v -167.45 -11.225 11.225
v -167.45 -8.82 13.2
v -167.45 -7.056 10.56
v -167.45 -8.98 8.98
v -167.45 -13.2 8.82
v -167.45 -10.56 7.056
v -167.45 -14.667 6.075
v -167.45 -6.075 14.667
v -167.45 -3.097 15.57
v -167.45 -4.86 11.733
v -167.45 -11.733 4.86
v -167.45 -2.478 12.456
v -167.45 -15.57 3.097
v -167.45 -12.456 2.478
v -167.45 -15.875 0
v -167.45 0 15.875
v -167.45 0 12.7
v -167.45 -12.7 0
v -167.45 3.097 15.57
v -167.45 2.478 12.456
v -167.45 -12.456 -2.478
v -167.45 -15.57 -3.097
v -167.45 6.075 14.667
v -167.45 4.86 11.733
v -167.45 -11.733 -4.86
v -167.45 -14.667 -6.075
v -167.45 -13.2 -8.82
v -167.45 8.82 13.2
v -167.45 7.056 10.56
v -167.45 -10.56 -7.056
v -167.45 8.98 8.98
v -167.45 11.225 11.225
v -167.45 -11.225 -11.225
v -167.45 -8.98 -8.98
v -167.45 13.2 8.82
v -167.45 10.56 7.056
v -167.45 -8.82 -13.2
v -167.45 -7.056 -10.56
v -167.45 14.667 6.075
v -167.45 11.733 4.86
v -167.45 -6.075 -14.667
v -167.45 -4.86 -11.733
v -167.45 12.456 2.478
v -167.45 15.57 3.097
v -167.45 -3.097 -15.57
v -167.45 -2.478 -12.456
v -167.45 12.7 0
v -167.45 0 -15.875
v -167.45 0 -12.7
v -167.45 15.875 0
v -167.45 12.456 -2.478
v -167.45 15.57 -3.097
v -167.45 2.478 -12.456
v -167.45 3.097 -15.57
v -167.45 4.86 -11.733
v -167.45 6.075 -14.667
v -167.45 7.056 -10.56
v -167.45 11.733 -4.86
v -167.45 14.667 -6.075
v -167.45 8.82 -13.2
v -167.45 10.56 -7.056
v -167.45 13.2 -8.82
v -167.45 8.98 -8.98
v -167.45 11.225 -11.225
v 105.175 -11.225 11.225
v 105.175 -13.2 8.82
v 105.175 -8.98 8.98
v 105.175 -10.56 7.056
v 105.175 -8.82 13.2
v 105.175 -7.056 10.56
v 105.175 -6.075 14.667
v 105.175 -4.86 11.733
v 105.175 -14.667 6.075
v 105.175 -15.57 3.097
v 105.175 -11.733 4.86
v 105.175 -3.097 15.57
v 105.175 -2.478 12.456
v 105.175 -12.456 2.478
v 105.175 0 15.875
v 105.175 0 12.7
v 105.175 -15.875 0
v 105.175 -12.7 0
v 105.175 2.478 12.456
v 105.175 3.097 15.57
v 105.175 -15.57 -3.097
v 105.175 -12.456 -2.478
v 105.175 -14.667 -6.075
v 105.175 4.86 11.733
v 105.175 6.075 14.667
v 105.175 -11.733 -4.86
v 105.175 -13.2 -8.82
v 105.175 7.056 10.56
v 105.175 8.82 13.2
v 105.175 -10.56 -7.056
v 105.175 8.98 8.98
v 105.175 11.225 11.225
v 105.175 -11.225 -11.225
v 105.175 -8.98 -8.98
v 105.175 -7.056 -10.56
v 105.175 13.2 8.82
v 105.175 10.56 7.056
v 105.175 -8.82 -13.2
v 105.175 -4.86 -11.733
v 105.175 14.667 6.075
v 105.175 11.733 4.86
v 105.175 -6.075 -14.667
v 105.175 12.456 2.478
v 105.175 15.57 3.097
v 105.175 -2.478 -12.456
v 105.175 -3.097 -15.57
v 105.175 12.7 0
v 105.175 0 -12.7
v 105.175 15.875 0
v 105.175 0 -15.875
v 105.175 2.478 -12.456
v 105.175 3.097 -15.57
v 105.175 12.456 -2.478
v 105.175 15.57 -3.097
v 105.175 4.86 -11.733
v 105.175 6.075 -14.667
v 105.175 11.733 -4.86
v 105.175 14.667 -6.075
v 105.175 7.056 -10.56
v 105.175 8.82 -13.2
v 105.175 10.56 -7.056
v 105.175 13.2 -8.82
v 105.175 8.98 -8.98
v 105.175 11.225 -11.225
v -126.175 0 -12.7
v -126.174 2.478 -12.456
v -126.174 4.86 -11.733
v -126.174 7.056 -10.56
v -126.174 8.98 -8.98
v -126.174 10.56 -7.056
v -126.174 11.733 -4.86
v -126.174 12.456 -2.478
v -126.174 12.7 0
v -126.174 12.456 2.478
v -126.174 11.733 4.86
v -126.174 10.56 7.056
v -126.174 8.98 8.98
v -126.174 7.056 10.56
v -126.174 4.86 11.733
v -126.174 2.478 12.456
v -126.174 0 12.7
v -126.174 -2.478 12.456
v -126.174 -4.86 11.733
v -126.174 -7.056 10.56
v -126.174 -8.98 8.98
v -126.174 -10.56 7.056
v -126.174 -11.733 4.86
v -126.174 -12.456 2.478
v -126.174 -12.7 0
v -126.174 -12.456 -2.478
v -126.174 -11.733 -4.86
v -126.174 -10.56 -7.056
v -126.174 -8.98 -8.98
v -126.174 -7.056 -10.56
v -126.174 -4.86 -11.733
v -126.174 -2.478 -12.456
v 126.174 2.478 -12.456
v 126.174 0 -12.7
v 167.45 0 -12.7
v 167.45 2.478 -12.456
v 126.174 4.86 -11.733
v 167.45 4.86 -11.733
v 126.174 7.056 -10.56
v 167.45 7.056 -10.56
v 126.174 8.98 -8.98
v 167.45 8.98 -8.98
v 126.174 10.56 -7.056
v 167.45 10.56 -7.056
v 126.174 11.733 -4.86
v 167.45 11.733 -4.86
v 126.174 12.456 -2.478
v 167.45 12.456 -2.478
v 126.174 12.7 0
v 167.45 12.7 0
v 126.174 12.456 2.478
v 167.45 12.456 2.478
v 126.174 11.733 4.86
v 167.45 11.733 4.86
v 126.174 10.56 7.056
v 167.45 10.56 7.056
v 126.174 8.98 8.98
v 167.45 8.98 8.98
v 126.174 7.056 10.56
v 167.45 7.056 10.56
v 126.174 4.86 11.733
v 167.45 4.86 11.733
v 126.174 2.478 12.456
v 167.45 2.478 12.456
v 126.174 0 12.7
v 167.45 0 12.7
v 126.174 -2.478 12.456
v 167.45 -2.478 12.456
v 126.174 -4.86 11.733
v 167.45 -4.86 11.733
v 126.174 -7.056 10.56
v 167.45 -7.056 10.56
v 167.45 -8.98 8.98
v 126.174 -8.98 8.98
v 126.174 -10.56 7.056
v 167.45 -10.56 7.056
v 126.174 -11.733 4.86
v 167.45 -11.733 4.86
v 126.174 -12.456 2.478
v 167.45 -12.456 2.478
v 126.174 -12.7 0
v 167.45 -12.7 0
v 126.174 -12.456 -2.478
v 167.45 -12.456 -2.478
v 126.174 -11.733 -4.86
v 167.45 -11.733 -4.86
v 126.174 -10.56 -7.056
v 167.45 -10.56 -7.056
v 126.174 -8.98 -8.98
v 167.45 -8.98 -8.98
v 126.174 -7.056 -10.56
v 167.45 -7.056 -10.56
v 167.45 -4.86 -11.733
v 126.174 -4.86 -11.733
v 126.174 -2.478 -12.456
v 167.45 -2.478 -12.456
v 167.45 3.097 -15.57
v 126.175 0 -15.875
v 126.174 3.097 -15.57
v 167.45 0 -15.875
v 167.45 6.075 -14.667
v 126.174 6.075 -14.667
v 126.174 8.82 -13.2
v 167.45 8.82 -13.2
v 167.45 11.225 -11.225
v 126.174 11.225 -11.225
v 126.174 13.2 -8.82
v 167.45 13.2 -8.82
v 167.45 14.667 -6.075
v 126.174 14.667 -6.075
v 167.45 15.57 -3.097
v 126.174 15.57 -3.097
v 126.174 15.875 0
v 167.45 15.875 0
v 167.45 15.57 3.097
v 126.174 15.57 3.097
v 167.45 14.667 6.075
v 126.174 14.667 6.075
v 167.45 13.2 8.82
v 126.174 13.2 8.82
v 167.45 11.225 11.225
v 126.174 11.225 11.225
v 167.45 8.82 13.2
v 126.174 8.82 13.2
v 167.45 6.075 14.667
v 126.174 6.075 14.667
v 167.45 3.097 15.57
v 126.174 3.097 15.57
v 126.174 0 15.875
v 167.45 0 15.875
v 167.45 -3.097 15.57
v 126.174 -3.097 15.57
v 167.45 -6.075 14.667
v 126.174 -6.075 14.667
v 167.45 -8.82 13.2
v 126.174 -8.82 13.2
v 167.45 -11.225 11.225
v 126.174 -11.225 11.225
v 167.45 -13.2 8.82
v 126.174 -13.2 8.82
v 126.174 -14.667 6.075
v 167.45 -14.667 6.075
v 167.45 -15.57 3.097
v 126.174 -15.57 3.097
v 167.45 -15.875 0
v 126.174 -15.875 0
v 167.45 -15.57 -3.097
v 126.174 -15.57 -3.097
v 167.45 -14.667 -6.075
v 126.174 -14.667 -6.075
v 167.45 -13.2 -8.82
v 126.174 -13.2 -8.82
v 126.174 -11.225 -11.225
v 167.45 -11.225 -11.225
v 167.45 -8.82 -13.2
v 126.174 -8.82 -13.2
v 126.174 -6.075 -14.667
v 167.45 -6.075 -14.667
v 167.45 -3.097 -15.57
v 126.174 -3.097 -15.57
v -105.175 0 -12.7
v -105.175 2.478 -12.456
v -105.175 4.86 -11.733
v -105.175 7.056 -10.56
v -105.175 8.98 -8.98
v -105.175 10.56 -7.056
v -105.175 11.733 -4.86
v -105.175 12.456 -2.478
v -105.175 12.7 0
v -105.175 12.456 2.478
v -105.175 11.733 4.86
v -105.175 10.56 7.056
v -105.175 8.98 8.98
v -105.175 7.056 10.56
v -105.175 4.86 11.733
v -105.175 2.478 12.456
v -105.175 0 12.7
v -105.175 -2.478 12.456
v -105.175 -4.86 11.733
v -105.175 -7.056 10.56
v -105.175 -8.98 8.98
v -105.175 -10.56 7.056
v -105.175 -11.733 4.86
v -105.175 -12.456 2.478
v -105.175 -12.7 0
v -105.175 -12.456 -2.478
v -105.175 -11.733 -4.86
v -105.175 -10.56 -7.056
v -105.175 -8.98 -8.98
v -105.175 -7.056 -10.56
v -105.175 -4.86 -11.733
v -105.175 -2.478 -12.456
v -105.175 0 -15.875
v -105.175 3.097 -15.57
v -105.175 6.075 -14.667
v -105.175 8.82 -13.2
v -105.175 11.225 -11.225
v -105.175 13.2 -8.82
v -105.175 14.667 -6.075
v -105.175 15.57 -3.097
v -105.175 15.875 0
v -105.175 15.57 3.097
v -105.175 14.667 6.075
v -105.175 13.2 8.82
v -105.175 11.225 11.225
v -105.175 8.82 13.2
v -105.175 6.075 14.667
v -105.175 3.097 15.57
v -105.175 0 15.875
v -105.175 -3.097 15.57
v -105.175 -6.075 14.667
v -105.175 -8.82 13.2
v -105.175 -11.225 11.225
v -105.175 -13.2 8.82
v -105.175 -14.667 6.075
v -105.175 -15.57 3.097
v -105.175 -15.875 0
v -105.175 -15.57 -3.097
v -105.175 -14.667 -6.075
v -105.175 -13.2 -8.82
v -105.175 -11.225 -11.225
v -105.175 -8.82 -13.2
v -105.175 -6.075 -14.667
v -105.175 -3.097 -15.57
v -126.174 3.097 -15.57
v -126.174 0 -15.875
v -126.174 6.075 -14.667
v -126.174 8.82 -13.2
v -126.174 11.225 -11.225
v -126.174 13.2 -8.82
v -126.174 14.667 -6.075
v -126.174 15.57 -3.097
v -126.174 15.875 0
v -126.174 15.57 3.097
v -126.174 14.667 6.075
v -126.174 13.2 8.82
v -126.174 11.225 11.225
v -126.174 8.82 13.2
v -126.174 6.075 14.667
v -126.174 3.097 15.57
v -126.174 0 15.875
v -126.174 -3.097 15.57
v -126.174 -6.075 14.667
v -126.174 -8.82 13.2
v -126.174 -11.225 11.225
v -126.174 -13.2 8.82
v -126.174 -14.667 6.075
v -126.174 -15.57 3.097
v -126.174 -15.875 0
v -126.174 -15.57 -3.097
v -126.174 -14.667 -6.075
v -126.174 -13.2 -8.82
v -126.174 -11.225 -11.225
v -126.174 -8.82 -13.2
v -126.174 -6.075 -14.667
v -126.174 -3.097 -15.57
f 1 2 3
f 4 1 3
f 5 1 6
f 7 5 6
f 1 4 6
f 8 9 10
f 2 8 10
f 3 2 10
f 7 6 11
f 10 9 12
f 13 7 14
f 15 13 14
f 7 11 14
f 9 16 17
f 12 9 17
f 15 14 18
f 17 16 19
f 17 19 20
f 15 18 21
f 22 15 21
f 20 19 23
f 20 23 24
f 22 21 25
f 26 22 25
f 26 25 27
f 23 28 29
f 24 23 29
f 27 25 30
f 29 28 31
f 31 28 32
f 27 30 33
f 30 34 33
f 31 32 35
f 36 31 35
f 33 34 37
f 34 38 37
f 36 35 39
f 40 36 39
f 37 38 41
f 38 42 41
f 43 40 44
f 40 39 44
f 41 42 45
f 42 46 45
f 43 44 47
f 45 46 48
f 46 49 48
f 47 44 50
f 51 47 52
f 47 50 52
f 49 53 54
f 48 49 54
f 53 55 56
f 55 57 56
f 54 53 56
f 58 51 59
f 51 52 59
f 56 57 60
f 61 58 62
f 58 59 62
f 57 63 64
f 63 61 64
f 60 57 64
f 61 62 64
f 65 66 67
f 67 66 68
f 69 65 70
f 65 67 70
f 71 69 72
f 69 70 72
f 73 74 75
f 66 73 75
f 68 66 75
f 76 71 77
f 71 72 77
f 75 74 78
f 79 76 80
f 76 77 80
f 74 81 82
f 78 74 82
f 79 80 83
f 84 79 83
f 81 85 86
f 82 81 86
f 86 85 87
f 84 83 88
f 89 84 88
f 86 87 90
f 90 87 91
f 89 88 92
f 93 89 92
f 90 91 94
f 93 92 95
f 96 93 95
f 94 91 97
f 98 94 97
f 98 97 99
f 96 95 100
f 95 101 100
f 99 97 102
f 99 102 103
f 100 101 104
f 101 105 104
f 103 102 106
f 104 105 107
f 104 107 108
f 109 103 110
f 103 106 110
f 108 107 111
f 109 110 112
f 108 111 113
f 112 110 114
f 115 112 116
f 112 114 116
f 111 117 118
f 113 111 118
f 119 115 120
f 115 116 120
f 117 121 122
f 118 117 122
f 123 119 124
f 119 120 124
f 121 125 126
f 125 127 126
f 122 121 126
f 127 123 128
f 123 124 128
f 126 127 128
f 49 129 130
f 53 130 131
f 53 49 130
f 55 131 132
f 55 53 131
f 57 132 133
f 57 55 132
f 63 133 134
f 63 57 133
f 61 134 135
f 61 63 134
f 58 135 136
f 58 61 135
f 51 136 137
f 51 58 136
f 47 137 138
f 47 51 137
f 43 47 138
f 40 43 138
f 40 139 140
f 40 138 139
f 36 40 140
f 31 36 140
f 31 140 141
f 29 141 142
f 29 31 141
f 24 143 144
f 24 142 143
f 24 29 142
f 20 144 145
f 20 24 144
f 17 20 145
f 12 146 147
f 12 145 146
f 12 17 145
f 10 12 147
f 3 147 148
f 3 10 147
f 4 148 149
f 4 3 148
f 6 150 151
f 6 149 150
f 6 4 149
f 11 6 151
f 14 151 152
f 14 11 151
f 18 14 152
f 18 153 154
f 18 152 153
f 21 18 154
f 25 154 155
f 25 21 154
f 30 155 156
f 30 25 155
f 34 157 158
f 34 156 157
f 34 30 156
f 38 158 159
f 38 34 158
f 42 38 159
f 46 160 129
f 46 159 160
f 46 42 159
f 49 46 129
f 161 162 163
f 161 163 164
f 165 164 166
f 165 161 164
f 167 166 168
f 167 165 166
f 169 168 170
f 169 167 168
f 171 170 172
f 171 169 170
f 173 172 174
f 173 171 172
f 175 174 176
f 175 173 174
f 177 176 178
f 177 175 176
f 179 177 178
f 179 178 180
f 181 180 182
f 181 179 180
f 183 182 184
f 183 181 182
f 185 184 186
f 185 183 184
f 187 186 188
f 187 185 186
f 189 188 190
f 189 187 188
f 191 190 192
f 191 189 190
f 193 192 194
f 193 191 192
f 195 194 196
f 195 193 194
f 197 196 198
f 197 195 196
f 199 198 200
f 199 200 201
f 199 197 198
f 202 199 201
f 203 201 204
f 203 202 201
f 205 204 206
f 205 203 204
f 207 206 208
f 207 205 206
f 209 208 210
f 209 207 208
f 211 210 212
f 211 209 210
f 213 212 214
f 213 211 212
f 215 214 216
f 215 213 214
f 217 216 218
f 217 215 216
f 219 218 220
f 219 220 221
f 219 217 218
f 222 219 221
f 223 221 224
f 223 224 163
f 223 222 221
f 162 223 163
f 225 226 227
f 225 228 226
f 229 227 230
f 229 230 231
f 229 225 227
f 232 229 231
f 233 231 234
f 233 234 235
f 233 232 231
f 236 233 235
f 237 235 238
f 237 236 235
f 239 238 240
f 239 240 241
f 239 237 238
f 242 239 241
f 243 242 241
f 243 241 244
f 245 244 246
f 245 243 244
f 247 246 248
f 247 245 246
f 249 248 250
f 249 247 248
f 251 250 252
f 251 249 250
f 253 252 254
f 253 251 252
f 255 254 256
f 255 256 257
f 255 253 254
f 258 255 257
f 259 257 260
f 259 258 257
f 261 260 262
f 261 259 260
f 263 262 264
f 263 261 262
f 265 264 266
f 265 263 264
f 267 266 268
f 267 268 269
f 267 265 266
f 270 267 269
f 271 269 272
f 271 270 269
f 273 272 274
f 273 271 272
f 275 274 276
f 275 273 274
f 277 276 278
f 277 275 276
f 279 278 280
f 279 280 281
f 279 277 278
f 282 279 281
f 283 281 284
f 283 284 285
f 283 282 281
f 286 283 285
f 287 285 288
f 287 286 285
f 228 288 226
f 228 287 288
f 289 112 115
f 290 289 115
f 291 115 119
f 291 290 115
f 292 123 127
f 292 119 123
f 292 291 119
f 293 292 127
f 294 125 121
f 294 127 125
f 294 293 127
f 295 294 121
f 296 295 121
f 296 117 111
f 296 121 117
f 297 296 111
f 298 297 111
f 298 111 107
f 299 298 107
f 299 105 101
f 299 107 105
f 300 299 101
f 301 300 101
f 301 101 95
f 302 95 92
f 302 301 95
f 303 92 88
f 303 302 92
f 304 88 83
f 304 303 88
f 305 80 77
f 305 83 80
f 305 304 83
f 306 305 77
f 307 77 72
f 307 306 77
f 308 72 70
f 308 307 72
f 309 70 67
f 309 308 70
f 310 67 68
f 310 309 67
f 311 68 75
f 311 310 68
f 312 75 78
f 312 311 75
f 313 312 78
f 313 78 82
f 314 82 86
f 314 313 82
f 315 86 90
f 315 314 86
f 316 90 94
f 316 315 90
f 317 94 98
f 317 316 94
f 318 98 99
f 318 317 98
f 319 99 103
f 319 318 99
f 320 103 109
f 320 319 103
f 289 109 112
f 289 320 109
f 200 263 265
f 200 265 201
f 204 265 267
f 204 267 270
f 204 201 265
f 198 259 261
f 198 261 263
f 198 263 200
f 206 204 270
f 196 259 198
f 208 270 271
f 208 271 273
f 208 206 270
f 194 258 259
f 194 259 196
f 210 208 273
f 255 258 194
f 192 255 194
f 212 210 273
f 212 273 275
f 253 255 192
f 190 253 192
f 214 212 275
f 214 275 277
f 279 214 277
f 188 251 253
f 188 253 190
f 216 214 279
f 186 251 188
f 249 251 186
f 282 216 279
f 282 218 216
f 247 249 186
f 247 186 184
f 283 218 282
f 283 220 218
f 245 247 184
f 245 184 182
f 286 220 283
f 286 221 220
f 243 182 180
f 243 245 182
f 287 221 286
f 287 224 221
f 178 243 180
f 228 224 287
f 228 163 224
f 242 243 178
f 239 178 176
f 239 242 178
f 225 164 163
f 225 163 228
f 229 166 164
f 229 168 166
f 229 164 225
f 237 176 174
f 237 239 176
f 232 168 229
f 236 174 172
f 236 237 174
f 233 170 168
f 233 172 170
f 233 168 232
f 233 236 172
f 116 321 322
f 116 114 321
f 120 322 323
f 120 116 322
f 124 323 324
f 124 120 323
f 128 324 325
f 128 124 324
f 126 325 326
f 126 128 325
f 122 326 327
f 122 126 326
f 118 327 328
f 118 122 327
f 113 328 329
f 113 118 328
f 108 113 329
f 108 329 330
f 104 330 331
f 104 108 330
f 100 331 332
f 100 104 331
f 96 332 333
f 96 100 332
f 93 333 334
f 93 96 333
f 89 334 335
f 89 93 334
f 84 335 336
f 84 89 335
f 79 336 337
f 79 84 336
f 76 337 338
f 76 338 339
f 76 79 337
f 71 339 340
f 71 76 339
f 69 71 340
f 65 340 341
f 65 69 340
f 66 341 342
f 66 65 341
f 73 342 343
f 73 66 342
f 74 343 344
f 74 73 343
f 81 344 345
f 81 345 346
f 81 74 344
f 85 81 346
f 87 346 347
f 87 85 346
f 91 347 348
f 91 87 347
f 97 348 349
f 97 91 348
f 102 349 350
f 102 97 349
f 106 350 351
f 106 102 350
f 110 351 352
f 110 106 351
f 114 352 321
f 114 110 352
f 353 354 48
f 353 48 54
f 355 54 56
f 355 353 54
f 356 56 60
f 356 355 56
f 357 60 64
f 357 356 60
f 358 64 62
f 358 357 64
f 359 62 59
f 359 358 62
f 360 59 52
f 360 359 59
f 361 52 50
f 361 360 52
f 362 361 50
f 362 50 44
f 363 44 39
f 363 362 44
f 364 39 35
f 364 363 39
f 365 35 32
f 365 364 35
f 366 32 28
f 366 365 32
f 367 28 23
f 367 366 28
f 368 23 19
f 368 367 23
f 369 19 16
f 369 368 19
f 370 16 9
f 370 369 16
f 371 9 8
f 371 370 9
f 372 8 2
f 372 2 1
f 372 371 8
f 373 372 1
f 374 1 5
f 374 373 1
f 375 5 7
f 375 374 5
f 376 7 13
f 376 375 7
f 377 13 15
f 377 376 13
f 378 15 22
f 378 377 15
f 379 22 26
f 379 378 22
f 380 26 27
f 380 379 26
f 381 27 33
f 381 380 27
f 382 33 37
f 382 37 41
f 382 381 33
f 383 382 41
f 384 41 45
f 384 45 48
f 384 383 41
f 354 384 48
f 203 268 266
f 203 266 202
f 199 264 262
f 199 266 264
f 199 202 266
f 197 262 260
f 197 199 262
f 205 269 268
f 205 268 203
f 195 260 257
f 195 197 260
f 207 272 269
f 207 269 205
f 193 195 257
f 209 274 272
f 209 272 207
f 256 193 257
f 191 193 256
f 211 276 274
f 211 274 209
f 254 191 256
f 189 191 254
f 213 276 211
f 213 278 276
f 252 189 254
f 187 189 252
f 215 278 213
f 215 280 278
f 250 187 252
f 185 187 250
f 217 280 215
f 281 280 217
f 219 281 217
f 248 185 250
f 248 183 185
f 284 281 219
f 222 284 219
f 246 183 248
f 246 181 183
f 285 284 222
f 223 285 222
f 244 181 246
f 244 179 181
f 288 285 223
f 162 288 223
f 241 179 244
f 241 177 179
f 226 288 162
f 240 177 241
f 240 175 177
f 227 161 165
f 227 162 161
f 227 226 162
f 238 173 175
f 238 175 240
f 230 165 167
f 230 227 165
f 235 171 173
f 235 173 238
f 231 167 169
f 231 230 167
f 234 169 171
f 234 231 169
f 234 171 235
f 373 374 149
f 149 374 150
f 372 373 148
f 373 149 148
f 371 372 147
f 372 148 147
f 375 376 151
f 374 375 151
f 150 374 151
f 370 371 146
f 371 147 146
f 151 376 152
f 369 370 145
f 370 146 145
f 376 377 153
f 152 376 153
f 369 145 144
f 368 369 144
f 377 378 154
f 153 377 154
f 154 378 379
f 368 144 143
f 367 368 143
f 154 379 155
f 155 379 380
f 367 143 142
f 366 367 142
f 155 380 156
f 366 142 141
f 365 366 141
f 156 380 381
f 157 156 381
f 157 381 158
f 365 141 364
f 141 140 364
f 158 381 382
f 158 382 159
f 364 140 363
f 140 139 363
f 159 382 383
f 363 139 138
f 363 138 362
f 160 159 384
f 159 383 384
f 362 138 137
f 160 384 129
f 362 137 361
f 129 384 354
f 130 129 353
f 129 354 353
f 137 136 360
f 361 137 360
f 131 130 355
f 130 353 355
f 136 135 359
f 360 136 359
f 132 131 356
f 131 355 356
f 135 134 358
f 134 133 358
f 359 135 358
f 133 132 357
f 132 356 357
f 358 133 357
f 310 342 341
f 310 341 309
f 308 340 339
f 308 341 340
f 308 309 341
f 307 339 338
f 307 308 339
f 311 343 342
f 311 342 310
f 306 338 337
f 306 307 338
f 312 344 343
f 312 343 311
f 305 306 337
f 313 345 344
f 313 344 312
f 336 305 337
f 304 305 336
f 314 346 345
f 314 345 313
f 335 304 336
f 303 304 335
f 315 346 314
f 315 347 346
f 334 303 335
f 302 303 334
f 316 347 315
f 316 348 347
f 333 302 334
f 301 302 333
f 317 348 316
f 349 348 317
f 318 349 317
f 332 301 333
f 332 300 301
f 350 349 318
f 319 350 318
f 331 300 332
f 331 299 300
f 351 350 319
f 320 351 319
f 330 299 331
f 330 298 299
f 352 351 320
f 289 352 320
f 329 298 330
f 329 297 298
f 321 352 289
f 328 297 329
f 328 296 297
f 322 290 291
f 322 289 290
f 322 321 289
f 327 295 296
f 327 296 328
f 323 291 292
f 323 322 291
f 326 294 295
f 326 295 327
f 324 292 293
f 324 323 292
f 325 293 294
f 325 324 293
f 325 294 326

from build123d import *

# Parameters (mm, degrees)
SKETCH1_R               = 15.875
SKETCH1_R_2             = 12.7
EXTRUDE_THIN1_DEPTH     = 167.4495
CUT_EXTRUDE1_DEPTH      = 169.947821236
CUT_EXTRUDE1_DEPTH_BACK = 169.947821236
SKETCH2_W               = 20.99999991
SKETCH2_H               = 31.75


with BuildPart() as part:
    # Sketch1 → Extrude-Thin1 (new, symmetric)
    with BuildSketch(Plane(origin=(0, 0, 0), x_dir=(0, 0, -1), z_dir=(1, 0, 0))):
        Circle(SKETCH1_R)
        Circle(SKETCH1_R_2, mode=Mode.SUBTRACT)
    extrude(amount=EXTRUDE_THIN1_DEPTH, both=True)

    # Sketch2 → Cut-Extrude1 (cut, two sides: drawn at the far end of the back side and taken through both)
    with BuildSketch(Plane.XY.offset(-CUT_EXTRUDE1_DEPTH_BACK)):
        with Locations((115.674500045, 0)):
            Rectangle(SKETCH2_W, SKETCH2_H)
        with Locations((-115.674500045, 0)):
            Rectangle(SKETCH2_W, SKETCH2_H)
    extrude(amount=CUT_EXTRUDE1_DEPTH + CUT_EXTRUDE1_DEPTH_BACK, mode=Mode.SUBTRACT)


with BuildPart() as cut_extrude1_piece_1:
    # of the separate pieces the step leaves, piece 1, a body of its own (cut_extrude1_pieces)
    add(part.part.solids().sort_by_distance((-105.17450009, 0, -15.875))[0])


with BuildPart() as cut_extrude1_piece_2:
    # of the separate pieces the step leaves, piece 2, a body of its own (cut_extrude1_pieces)
    add(part.part.solids().sort_by_distance((-167.4495, 0, -15.875))[0])


with BuildPart() as cut_extrude1_piece_3:
    # of the separate pieces the step leaves, piece 3, a body of its own (cut_extrude1_pieces)
    add(part.part.solids().sort_by_distance((126.1745, 0, -15.875))[0])


solid = Compound([cut_extrude1_piece_1.part, cut_extrude1_piece_2.part, cut_extrude1_piece_3.part])
